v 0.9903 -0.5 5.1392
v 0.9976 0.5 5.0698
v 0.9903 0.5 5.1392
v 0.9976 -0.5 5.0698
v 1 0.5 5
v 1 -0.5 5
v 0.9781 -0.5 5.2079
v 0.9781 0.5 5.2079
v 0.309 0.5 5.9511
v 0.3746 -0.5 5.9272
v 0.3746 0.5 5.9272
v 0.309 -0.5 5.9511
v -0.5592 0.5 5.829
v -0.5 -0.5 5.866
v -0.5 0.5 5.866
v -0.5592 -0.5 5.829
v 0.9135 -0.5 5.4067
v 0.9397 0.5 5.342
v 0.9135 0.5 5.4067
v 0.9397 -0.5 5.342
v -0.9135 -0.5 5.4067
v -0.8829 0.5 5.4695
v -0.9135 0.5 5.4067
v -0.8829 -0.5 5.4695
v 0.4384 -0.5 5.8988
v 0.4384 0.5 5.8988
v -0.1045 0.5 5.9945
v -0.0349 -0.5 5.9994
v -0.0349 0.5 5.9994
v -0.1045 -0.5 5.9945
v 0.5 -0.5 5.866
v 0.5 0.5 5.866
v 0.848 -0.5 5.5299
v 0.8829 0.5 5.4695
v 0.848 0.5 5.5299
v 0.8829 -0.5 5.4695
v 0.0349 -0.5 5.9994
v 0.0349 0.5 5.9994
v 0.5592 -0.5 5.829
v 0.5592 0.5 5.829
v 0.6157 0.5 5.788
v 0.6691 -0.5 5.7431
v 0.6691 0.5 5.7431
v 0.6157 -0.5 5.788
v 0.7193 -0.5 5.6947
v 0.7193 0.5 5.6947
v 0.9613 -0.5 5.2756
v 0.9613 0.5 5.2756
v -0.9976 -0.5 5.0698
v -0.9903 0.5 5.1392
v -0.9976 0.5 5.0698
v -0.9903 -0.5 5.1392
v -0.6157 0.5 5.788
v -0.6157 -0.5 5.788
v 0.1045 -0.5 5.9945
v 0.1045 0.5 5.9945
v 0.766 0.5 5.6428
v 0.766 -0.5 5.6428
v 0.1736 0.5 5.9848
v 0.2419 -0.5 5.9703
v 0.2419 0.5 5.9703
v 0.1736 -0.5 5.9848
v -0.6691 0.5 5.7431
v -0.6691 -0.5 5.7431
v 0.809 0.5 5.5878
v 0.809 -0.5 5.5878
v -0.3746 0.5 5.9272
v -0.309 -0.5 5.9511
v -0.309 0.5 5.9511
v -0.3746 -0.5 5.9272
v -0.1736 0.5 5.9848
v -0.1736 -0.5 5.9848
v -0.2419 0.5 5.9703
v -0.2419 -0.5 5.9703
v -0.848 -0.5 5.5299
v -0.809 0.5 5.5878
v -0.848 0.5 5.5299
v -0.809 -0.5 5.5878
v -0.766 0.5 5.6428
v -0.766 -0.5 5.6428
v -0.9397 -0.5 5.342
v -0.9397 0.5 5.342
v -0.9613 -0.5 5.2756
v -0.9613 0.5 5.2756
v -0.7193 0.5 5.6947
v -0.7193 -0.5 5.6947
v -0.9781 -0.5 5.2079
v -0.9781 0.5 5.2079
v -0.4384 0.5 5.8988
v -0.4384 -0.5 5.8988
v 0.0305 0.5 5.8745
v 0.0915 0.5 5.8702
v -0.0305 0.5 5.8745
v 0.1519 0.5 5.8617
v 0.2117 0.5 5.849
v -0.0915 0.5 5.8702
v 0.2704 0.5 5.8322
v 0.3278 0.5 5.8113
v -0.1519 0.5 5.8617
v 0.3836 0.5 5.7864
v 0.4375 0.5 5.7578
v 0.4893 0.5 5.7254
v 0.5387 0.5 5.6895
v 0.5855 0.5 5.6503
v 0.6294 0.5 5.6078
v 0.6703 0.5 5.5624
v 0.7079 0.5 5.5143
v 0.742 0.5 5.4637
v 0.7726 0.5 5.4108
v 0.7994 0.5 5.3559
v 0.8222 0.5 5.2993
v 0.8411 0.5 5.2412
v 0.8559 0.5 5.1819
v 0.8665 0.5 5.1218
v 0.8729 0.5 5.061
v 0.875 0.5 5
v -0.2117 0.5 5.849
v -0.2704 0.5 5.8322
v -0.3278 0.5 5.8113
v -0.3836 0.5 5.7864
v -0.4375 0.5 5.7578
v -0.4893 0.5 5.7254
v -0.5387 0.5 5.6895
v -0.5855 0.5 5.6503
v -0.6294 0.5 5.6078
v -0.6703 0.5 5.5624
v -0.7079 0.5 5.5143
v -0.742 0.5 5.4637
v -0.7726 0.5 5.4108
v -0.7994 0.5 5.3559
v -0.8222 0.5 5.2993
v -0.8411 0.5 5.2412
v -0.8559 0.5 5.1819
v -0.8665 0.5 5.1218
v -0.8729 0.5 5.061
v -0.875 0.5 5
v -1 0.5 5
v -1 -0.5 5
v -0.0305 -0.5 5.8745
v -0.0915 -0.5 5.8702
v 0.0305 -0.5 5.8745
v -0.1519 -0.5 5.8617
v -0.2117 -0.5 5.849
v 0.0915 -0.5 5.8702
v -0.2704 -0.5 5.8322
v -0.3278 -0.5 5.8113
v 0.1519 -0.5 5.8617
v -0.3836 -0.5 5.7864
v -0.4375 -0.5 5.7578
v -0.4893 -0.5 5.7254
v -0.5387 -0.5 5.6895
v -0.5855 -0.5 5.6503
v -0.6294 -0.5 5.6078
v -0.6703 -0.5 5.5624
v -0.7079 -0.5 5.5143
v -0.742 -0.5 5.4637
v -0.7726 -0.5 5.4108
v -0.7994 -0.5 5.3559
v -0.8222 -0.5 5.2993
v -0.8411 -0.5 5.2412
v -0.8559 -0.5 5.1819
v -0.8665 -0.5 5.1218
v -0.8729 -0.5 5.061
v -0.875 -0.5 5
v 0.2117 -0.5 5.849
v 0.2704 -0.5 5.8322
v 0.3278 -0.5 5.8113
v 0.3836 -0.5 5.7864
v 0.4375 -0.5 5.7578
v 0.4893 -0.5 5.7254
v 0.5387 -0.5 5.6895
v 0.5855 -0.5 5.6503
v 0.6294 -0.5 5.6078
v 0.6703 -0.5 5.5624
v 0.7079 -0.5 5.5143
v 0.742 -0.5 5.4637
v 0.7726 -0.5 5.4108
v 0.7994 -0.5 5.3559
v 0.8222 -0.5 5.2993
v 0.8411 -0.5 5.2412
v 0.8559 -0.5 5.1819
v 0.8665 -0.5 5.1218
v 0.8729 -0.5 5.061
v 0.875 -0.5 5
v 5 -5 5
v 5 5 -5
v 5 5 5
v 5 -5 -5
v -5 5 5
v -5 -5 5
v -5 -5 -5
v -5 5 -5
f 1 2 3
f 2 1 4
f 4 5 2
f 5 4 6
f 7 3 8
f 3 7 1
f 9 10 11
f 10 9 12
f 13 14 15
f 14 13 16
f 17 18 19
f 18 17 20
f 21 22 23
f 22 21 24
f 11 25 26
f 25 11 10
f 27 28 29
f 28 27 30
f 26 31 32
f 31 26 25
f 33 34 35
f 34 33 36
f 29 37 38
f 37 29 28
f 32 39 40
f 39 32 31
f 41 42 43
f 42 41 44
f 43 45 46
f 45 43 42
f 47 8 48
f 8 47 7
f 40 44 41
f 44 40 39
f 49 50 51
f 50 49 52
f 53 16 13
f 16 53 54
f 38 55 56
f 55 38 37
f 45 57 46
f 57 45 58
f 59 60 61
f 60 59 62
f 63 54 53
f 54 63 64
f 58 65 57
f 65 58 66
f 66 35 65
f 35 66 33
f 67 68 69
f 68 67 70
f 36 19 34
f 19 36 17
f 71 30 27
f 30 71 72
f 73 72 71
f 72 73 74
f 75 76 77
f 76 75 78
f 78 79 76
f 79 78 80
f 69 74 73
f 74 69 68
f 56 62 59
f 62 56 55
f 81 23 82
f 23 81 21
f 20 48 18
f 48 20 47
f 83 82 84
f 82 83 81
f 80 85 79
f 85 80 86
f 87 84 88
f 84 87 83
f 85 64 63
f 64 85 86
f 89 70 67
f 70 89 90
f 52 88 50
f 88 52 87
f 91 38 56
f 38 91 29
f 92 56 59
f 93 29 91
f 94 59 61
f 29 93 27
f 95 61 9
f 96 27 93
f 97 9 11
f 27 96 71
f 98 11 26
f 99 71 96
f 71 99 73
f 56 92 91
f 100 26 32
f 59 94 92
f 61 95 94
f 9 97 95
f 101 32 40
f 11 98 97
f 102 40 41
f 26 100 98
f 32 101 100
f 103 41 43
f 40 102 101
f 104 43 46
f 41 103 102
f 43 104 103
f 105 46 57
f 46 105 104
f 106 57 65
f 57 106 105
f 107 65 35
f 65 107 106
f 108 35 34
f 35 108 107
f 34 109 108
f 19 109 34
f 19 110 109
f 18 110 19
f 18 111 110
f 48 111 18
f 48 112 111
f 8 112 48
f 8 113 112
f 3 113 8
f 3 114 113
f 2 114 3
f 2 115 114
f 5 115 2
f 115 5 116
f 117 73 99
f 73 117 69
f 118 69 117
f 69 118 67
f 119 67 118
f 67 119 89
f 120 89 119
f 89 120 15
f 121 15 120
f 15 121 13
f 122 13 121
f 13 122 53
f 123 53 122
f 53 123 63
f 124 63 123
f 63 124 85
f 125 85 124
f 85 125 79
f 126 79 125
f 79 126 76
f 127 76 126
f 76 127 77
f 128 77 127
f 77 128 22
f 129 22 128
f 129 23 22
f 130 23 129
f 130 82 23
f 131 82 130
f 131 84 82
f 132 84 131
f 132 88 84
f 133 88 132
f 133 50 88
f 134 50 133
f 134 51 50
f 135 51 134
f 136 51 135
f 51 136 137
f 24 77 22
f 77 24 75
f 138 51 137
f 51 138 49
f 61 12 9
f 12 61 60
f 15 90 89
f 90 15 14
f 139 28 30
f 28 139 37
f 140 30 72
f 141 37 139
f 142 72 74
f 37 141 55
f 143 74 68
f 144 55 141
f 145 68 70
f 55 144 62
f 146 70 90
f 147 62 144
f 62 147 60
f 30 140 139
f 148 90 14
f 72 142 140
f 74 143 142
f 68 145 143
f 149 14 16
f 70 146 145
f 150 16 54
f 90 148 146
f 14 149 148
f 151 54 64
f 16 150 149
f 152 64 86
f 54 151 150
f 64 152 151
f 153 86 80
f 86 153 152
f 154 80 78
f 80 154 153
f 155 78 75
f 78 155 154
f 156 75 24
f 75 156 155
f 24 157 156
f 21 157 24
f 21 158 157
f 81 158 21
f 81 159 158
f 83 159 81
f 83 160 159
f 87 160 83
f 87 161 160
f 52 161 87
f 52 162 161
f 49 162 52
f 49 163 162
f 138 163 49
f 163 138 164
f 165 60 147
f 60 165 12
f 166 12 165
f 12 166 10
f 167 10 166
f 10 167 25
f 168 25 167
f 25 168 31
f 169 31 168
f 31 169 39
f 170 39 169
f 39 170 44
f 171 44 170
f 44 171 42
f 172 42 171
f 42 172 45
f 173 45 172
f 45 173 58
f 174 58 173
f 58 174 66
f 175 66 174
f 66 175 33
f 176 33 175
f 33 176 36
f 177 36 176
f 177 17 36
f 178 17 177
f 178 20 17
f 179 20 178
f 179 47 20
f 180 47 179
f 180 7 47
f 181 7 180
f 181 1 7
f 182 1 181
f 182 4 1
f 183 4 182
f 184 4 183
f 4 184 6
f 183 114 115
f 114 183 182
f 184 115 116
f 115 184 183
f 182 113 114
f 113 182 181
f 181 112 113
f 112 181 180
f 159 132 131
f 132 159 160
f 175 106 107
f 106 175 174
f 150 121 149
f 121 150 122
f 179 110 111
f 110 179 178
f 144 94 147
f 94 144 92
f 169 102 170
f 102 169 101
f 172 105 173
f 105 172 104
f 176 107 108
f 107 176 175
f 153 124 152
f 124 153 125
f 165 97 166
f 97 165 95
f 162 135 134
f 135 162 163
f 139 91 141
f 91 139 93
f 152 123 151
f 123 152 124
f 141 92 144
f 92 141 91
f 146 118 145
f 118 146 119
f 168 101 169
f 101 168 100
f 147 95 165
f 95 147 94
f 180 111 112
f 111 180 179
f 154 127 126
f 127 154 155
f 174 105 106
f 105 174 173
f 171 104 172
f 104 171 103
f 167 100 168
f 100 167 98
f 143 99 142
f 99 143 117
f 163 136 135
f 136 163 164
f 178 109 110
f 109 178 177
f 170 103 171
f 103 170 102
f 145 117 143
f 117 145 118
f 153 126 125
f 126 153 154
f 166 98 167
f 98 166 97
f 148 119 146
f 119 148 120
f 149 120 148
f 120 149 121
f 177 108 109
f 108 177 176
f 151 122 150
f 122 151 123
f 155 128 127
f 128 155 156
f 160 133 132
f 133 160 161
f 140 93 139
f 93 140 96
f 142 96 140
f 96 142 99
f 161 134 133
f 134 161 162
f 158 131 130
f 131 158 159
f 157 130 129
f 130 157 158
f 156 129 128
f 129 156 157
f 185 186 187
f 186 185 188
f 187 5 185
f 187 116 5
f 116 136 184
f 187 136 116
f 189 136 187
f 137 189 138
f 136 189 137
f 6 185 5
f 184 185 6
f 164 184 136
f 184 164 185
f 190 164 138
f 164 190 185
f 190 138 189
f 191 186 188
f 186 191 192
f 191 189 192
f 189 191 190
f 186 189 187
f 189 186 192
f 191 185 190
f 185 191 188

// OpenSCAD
// An ornament holder
// Use the code:
// use </path/to/lib/Holder.scad>
// to use this module

module holder(l=1, d=1, w=0.25) {
    // l=length, d=diameter, w=width
    // length is the length of the cylinder on the x axis
    // diameter is the size of the circle
    // width is width of solid holder part
    facets = 90;
    rotate([90]) difference() {
        cylinder(l, d=d,
        $fn=facets, center=true);
        cylinder(l+0.25, d=d-w, 
        $fn=facets, center=true);
    }
}

// Sample code
cube(10, center=true);
// translate it up so it is half in the cube
translate([0, 0, 5])
holder(1, 2);
